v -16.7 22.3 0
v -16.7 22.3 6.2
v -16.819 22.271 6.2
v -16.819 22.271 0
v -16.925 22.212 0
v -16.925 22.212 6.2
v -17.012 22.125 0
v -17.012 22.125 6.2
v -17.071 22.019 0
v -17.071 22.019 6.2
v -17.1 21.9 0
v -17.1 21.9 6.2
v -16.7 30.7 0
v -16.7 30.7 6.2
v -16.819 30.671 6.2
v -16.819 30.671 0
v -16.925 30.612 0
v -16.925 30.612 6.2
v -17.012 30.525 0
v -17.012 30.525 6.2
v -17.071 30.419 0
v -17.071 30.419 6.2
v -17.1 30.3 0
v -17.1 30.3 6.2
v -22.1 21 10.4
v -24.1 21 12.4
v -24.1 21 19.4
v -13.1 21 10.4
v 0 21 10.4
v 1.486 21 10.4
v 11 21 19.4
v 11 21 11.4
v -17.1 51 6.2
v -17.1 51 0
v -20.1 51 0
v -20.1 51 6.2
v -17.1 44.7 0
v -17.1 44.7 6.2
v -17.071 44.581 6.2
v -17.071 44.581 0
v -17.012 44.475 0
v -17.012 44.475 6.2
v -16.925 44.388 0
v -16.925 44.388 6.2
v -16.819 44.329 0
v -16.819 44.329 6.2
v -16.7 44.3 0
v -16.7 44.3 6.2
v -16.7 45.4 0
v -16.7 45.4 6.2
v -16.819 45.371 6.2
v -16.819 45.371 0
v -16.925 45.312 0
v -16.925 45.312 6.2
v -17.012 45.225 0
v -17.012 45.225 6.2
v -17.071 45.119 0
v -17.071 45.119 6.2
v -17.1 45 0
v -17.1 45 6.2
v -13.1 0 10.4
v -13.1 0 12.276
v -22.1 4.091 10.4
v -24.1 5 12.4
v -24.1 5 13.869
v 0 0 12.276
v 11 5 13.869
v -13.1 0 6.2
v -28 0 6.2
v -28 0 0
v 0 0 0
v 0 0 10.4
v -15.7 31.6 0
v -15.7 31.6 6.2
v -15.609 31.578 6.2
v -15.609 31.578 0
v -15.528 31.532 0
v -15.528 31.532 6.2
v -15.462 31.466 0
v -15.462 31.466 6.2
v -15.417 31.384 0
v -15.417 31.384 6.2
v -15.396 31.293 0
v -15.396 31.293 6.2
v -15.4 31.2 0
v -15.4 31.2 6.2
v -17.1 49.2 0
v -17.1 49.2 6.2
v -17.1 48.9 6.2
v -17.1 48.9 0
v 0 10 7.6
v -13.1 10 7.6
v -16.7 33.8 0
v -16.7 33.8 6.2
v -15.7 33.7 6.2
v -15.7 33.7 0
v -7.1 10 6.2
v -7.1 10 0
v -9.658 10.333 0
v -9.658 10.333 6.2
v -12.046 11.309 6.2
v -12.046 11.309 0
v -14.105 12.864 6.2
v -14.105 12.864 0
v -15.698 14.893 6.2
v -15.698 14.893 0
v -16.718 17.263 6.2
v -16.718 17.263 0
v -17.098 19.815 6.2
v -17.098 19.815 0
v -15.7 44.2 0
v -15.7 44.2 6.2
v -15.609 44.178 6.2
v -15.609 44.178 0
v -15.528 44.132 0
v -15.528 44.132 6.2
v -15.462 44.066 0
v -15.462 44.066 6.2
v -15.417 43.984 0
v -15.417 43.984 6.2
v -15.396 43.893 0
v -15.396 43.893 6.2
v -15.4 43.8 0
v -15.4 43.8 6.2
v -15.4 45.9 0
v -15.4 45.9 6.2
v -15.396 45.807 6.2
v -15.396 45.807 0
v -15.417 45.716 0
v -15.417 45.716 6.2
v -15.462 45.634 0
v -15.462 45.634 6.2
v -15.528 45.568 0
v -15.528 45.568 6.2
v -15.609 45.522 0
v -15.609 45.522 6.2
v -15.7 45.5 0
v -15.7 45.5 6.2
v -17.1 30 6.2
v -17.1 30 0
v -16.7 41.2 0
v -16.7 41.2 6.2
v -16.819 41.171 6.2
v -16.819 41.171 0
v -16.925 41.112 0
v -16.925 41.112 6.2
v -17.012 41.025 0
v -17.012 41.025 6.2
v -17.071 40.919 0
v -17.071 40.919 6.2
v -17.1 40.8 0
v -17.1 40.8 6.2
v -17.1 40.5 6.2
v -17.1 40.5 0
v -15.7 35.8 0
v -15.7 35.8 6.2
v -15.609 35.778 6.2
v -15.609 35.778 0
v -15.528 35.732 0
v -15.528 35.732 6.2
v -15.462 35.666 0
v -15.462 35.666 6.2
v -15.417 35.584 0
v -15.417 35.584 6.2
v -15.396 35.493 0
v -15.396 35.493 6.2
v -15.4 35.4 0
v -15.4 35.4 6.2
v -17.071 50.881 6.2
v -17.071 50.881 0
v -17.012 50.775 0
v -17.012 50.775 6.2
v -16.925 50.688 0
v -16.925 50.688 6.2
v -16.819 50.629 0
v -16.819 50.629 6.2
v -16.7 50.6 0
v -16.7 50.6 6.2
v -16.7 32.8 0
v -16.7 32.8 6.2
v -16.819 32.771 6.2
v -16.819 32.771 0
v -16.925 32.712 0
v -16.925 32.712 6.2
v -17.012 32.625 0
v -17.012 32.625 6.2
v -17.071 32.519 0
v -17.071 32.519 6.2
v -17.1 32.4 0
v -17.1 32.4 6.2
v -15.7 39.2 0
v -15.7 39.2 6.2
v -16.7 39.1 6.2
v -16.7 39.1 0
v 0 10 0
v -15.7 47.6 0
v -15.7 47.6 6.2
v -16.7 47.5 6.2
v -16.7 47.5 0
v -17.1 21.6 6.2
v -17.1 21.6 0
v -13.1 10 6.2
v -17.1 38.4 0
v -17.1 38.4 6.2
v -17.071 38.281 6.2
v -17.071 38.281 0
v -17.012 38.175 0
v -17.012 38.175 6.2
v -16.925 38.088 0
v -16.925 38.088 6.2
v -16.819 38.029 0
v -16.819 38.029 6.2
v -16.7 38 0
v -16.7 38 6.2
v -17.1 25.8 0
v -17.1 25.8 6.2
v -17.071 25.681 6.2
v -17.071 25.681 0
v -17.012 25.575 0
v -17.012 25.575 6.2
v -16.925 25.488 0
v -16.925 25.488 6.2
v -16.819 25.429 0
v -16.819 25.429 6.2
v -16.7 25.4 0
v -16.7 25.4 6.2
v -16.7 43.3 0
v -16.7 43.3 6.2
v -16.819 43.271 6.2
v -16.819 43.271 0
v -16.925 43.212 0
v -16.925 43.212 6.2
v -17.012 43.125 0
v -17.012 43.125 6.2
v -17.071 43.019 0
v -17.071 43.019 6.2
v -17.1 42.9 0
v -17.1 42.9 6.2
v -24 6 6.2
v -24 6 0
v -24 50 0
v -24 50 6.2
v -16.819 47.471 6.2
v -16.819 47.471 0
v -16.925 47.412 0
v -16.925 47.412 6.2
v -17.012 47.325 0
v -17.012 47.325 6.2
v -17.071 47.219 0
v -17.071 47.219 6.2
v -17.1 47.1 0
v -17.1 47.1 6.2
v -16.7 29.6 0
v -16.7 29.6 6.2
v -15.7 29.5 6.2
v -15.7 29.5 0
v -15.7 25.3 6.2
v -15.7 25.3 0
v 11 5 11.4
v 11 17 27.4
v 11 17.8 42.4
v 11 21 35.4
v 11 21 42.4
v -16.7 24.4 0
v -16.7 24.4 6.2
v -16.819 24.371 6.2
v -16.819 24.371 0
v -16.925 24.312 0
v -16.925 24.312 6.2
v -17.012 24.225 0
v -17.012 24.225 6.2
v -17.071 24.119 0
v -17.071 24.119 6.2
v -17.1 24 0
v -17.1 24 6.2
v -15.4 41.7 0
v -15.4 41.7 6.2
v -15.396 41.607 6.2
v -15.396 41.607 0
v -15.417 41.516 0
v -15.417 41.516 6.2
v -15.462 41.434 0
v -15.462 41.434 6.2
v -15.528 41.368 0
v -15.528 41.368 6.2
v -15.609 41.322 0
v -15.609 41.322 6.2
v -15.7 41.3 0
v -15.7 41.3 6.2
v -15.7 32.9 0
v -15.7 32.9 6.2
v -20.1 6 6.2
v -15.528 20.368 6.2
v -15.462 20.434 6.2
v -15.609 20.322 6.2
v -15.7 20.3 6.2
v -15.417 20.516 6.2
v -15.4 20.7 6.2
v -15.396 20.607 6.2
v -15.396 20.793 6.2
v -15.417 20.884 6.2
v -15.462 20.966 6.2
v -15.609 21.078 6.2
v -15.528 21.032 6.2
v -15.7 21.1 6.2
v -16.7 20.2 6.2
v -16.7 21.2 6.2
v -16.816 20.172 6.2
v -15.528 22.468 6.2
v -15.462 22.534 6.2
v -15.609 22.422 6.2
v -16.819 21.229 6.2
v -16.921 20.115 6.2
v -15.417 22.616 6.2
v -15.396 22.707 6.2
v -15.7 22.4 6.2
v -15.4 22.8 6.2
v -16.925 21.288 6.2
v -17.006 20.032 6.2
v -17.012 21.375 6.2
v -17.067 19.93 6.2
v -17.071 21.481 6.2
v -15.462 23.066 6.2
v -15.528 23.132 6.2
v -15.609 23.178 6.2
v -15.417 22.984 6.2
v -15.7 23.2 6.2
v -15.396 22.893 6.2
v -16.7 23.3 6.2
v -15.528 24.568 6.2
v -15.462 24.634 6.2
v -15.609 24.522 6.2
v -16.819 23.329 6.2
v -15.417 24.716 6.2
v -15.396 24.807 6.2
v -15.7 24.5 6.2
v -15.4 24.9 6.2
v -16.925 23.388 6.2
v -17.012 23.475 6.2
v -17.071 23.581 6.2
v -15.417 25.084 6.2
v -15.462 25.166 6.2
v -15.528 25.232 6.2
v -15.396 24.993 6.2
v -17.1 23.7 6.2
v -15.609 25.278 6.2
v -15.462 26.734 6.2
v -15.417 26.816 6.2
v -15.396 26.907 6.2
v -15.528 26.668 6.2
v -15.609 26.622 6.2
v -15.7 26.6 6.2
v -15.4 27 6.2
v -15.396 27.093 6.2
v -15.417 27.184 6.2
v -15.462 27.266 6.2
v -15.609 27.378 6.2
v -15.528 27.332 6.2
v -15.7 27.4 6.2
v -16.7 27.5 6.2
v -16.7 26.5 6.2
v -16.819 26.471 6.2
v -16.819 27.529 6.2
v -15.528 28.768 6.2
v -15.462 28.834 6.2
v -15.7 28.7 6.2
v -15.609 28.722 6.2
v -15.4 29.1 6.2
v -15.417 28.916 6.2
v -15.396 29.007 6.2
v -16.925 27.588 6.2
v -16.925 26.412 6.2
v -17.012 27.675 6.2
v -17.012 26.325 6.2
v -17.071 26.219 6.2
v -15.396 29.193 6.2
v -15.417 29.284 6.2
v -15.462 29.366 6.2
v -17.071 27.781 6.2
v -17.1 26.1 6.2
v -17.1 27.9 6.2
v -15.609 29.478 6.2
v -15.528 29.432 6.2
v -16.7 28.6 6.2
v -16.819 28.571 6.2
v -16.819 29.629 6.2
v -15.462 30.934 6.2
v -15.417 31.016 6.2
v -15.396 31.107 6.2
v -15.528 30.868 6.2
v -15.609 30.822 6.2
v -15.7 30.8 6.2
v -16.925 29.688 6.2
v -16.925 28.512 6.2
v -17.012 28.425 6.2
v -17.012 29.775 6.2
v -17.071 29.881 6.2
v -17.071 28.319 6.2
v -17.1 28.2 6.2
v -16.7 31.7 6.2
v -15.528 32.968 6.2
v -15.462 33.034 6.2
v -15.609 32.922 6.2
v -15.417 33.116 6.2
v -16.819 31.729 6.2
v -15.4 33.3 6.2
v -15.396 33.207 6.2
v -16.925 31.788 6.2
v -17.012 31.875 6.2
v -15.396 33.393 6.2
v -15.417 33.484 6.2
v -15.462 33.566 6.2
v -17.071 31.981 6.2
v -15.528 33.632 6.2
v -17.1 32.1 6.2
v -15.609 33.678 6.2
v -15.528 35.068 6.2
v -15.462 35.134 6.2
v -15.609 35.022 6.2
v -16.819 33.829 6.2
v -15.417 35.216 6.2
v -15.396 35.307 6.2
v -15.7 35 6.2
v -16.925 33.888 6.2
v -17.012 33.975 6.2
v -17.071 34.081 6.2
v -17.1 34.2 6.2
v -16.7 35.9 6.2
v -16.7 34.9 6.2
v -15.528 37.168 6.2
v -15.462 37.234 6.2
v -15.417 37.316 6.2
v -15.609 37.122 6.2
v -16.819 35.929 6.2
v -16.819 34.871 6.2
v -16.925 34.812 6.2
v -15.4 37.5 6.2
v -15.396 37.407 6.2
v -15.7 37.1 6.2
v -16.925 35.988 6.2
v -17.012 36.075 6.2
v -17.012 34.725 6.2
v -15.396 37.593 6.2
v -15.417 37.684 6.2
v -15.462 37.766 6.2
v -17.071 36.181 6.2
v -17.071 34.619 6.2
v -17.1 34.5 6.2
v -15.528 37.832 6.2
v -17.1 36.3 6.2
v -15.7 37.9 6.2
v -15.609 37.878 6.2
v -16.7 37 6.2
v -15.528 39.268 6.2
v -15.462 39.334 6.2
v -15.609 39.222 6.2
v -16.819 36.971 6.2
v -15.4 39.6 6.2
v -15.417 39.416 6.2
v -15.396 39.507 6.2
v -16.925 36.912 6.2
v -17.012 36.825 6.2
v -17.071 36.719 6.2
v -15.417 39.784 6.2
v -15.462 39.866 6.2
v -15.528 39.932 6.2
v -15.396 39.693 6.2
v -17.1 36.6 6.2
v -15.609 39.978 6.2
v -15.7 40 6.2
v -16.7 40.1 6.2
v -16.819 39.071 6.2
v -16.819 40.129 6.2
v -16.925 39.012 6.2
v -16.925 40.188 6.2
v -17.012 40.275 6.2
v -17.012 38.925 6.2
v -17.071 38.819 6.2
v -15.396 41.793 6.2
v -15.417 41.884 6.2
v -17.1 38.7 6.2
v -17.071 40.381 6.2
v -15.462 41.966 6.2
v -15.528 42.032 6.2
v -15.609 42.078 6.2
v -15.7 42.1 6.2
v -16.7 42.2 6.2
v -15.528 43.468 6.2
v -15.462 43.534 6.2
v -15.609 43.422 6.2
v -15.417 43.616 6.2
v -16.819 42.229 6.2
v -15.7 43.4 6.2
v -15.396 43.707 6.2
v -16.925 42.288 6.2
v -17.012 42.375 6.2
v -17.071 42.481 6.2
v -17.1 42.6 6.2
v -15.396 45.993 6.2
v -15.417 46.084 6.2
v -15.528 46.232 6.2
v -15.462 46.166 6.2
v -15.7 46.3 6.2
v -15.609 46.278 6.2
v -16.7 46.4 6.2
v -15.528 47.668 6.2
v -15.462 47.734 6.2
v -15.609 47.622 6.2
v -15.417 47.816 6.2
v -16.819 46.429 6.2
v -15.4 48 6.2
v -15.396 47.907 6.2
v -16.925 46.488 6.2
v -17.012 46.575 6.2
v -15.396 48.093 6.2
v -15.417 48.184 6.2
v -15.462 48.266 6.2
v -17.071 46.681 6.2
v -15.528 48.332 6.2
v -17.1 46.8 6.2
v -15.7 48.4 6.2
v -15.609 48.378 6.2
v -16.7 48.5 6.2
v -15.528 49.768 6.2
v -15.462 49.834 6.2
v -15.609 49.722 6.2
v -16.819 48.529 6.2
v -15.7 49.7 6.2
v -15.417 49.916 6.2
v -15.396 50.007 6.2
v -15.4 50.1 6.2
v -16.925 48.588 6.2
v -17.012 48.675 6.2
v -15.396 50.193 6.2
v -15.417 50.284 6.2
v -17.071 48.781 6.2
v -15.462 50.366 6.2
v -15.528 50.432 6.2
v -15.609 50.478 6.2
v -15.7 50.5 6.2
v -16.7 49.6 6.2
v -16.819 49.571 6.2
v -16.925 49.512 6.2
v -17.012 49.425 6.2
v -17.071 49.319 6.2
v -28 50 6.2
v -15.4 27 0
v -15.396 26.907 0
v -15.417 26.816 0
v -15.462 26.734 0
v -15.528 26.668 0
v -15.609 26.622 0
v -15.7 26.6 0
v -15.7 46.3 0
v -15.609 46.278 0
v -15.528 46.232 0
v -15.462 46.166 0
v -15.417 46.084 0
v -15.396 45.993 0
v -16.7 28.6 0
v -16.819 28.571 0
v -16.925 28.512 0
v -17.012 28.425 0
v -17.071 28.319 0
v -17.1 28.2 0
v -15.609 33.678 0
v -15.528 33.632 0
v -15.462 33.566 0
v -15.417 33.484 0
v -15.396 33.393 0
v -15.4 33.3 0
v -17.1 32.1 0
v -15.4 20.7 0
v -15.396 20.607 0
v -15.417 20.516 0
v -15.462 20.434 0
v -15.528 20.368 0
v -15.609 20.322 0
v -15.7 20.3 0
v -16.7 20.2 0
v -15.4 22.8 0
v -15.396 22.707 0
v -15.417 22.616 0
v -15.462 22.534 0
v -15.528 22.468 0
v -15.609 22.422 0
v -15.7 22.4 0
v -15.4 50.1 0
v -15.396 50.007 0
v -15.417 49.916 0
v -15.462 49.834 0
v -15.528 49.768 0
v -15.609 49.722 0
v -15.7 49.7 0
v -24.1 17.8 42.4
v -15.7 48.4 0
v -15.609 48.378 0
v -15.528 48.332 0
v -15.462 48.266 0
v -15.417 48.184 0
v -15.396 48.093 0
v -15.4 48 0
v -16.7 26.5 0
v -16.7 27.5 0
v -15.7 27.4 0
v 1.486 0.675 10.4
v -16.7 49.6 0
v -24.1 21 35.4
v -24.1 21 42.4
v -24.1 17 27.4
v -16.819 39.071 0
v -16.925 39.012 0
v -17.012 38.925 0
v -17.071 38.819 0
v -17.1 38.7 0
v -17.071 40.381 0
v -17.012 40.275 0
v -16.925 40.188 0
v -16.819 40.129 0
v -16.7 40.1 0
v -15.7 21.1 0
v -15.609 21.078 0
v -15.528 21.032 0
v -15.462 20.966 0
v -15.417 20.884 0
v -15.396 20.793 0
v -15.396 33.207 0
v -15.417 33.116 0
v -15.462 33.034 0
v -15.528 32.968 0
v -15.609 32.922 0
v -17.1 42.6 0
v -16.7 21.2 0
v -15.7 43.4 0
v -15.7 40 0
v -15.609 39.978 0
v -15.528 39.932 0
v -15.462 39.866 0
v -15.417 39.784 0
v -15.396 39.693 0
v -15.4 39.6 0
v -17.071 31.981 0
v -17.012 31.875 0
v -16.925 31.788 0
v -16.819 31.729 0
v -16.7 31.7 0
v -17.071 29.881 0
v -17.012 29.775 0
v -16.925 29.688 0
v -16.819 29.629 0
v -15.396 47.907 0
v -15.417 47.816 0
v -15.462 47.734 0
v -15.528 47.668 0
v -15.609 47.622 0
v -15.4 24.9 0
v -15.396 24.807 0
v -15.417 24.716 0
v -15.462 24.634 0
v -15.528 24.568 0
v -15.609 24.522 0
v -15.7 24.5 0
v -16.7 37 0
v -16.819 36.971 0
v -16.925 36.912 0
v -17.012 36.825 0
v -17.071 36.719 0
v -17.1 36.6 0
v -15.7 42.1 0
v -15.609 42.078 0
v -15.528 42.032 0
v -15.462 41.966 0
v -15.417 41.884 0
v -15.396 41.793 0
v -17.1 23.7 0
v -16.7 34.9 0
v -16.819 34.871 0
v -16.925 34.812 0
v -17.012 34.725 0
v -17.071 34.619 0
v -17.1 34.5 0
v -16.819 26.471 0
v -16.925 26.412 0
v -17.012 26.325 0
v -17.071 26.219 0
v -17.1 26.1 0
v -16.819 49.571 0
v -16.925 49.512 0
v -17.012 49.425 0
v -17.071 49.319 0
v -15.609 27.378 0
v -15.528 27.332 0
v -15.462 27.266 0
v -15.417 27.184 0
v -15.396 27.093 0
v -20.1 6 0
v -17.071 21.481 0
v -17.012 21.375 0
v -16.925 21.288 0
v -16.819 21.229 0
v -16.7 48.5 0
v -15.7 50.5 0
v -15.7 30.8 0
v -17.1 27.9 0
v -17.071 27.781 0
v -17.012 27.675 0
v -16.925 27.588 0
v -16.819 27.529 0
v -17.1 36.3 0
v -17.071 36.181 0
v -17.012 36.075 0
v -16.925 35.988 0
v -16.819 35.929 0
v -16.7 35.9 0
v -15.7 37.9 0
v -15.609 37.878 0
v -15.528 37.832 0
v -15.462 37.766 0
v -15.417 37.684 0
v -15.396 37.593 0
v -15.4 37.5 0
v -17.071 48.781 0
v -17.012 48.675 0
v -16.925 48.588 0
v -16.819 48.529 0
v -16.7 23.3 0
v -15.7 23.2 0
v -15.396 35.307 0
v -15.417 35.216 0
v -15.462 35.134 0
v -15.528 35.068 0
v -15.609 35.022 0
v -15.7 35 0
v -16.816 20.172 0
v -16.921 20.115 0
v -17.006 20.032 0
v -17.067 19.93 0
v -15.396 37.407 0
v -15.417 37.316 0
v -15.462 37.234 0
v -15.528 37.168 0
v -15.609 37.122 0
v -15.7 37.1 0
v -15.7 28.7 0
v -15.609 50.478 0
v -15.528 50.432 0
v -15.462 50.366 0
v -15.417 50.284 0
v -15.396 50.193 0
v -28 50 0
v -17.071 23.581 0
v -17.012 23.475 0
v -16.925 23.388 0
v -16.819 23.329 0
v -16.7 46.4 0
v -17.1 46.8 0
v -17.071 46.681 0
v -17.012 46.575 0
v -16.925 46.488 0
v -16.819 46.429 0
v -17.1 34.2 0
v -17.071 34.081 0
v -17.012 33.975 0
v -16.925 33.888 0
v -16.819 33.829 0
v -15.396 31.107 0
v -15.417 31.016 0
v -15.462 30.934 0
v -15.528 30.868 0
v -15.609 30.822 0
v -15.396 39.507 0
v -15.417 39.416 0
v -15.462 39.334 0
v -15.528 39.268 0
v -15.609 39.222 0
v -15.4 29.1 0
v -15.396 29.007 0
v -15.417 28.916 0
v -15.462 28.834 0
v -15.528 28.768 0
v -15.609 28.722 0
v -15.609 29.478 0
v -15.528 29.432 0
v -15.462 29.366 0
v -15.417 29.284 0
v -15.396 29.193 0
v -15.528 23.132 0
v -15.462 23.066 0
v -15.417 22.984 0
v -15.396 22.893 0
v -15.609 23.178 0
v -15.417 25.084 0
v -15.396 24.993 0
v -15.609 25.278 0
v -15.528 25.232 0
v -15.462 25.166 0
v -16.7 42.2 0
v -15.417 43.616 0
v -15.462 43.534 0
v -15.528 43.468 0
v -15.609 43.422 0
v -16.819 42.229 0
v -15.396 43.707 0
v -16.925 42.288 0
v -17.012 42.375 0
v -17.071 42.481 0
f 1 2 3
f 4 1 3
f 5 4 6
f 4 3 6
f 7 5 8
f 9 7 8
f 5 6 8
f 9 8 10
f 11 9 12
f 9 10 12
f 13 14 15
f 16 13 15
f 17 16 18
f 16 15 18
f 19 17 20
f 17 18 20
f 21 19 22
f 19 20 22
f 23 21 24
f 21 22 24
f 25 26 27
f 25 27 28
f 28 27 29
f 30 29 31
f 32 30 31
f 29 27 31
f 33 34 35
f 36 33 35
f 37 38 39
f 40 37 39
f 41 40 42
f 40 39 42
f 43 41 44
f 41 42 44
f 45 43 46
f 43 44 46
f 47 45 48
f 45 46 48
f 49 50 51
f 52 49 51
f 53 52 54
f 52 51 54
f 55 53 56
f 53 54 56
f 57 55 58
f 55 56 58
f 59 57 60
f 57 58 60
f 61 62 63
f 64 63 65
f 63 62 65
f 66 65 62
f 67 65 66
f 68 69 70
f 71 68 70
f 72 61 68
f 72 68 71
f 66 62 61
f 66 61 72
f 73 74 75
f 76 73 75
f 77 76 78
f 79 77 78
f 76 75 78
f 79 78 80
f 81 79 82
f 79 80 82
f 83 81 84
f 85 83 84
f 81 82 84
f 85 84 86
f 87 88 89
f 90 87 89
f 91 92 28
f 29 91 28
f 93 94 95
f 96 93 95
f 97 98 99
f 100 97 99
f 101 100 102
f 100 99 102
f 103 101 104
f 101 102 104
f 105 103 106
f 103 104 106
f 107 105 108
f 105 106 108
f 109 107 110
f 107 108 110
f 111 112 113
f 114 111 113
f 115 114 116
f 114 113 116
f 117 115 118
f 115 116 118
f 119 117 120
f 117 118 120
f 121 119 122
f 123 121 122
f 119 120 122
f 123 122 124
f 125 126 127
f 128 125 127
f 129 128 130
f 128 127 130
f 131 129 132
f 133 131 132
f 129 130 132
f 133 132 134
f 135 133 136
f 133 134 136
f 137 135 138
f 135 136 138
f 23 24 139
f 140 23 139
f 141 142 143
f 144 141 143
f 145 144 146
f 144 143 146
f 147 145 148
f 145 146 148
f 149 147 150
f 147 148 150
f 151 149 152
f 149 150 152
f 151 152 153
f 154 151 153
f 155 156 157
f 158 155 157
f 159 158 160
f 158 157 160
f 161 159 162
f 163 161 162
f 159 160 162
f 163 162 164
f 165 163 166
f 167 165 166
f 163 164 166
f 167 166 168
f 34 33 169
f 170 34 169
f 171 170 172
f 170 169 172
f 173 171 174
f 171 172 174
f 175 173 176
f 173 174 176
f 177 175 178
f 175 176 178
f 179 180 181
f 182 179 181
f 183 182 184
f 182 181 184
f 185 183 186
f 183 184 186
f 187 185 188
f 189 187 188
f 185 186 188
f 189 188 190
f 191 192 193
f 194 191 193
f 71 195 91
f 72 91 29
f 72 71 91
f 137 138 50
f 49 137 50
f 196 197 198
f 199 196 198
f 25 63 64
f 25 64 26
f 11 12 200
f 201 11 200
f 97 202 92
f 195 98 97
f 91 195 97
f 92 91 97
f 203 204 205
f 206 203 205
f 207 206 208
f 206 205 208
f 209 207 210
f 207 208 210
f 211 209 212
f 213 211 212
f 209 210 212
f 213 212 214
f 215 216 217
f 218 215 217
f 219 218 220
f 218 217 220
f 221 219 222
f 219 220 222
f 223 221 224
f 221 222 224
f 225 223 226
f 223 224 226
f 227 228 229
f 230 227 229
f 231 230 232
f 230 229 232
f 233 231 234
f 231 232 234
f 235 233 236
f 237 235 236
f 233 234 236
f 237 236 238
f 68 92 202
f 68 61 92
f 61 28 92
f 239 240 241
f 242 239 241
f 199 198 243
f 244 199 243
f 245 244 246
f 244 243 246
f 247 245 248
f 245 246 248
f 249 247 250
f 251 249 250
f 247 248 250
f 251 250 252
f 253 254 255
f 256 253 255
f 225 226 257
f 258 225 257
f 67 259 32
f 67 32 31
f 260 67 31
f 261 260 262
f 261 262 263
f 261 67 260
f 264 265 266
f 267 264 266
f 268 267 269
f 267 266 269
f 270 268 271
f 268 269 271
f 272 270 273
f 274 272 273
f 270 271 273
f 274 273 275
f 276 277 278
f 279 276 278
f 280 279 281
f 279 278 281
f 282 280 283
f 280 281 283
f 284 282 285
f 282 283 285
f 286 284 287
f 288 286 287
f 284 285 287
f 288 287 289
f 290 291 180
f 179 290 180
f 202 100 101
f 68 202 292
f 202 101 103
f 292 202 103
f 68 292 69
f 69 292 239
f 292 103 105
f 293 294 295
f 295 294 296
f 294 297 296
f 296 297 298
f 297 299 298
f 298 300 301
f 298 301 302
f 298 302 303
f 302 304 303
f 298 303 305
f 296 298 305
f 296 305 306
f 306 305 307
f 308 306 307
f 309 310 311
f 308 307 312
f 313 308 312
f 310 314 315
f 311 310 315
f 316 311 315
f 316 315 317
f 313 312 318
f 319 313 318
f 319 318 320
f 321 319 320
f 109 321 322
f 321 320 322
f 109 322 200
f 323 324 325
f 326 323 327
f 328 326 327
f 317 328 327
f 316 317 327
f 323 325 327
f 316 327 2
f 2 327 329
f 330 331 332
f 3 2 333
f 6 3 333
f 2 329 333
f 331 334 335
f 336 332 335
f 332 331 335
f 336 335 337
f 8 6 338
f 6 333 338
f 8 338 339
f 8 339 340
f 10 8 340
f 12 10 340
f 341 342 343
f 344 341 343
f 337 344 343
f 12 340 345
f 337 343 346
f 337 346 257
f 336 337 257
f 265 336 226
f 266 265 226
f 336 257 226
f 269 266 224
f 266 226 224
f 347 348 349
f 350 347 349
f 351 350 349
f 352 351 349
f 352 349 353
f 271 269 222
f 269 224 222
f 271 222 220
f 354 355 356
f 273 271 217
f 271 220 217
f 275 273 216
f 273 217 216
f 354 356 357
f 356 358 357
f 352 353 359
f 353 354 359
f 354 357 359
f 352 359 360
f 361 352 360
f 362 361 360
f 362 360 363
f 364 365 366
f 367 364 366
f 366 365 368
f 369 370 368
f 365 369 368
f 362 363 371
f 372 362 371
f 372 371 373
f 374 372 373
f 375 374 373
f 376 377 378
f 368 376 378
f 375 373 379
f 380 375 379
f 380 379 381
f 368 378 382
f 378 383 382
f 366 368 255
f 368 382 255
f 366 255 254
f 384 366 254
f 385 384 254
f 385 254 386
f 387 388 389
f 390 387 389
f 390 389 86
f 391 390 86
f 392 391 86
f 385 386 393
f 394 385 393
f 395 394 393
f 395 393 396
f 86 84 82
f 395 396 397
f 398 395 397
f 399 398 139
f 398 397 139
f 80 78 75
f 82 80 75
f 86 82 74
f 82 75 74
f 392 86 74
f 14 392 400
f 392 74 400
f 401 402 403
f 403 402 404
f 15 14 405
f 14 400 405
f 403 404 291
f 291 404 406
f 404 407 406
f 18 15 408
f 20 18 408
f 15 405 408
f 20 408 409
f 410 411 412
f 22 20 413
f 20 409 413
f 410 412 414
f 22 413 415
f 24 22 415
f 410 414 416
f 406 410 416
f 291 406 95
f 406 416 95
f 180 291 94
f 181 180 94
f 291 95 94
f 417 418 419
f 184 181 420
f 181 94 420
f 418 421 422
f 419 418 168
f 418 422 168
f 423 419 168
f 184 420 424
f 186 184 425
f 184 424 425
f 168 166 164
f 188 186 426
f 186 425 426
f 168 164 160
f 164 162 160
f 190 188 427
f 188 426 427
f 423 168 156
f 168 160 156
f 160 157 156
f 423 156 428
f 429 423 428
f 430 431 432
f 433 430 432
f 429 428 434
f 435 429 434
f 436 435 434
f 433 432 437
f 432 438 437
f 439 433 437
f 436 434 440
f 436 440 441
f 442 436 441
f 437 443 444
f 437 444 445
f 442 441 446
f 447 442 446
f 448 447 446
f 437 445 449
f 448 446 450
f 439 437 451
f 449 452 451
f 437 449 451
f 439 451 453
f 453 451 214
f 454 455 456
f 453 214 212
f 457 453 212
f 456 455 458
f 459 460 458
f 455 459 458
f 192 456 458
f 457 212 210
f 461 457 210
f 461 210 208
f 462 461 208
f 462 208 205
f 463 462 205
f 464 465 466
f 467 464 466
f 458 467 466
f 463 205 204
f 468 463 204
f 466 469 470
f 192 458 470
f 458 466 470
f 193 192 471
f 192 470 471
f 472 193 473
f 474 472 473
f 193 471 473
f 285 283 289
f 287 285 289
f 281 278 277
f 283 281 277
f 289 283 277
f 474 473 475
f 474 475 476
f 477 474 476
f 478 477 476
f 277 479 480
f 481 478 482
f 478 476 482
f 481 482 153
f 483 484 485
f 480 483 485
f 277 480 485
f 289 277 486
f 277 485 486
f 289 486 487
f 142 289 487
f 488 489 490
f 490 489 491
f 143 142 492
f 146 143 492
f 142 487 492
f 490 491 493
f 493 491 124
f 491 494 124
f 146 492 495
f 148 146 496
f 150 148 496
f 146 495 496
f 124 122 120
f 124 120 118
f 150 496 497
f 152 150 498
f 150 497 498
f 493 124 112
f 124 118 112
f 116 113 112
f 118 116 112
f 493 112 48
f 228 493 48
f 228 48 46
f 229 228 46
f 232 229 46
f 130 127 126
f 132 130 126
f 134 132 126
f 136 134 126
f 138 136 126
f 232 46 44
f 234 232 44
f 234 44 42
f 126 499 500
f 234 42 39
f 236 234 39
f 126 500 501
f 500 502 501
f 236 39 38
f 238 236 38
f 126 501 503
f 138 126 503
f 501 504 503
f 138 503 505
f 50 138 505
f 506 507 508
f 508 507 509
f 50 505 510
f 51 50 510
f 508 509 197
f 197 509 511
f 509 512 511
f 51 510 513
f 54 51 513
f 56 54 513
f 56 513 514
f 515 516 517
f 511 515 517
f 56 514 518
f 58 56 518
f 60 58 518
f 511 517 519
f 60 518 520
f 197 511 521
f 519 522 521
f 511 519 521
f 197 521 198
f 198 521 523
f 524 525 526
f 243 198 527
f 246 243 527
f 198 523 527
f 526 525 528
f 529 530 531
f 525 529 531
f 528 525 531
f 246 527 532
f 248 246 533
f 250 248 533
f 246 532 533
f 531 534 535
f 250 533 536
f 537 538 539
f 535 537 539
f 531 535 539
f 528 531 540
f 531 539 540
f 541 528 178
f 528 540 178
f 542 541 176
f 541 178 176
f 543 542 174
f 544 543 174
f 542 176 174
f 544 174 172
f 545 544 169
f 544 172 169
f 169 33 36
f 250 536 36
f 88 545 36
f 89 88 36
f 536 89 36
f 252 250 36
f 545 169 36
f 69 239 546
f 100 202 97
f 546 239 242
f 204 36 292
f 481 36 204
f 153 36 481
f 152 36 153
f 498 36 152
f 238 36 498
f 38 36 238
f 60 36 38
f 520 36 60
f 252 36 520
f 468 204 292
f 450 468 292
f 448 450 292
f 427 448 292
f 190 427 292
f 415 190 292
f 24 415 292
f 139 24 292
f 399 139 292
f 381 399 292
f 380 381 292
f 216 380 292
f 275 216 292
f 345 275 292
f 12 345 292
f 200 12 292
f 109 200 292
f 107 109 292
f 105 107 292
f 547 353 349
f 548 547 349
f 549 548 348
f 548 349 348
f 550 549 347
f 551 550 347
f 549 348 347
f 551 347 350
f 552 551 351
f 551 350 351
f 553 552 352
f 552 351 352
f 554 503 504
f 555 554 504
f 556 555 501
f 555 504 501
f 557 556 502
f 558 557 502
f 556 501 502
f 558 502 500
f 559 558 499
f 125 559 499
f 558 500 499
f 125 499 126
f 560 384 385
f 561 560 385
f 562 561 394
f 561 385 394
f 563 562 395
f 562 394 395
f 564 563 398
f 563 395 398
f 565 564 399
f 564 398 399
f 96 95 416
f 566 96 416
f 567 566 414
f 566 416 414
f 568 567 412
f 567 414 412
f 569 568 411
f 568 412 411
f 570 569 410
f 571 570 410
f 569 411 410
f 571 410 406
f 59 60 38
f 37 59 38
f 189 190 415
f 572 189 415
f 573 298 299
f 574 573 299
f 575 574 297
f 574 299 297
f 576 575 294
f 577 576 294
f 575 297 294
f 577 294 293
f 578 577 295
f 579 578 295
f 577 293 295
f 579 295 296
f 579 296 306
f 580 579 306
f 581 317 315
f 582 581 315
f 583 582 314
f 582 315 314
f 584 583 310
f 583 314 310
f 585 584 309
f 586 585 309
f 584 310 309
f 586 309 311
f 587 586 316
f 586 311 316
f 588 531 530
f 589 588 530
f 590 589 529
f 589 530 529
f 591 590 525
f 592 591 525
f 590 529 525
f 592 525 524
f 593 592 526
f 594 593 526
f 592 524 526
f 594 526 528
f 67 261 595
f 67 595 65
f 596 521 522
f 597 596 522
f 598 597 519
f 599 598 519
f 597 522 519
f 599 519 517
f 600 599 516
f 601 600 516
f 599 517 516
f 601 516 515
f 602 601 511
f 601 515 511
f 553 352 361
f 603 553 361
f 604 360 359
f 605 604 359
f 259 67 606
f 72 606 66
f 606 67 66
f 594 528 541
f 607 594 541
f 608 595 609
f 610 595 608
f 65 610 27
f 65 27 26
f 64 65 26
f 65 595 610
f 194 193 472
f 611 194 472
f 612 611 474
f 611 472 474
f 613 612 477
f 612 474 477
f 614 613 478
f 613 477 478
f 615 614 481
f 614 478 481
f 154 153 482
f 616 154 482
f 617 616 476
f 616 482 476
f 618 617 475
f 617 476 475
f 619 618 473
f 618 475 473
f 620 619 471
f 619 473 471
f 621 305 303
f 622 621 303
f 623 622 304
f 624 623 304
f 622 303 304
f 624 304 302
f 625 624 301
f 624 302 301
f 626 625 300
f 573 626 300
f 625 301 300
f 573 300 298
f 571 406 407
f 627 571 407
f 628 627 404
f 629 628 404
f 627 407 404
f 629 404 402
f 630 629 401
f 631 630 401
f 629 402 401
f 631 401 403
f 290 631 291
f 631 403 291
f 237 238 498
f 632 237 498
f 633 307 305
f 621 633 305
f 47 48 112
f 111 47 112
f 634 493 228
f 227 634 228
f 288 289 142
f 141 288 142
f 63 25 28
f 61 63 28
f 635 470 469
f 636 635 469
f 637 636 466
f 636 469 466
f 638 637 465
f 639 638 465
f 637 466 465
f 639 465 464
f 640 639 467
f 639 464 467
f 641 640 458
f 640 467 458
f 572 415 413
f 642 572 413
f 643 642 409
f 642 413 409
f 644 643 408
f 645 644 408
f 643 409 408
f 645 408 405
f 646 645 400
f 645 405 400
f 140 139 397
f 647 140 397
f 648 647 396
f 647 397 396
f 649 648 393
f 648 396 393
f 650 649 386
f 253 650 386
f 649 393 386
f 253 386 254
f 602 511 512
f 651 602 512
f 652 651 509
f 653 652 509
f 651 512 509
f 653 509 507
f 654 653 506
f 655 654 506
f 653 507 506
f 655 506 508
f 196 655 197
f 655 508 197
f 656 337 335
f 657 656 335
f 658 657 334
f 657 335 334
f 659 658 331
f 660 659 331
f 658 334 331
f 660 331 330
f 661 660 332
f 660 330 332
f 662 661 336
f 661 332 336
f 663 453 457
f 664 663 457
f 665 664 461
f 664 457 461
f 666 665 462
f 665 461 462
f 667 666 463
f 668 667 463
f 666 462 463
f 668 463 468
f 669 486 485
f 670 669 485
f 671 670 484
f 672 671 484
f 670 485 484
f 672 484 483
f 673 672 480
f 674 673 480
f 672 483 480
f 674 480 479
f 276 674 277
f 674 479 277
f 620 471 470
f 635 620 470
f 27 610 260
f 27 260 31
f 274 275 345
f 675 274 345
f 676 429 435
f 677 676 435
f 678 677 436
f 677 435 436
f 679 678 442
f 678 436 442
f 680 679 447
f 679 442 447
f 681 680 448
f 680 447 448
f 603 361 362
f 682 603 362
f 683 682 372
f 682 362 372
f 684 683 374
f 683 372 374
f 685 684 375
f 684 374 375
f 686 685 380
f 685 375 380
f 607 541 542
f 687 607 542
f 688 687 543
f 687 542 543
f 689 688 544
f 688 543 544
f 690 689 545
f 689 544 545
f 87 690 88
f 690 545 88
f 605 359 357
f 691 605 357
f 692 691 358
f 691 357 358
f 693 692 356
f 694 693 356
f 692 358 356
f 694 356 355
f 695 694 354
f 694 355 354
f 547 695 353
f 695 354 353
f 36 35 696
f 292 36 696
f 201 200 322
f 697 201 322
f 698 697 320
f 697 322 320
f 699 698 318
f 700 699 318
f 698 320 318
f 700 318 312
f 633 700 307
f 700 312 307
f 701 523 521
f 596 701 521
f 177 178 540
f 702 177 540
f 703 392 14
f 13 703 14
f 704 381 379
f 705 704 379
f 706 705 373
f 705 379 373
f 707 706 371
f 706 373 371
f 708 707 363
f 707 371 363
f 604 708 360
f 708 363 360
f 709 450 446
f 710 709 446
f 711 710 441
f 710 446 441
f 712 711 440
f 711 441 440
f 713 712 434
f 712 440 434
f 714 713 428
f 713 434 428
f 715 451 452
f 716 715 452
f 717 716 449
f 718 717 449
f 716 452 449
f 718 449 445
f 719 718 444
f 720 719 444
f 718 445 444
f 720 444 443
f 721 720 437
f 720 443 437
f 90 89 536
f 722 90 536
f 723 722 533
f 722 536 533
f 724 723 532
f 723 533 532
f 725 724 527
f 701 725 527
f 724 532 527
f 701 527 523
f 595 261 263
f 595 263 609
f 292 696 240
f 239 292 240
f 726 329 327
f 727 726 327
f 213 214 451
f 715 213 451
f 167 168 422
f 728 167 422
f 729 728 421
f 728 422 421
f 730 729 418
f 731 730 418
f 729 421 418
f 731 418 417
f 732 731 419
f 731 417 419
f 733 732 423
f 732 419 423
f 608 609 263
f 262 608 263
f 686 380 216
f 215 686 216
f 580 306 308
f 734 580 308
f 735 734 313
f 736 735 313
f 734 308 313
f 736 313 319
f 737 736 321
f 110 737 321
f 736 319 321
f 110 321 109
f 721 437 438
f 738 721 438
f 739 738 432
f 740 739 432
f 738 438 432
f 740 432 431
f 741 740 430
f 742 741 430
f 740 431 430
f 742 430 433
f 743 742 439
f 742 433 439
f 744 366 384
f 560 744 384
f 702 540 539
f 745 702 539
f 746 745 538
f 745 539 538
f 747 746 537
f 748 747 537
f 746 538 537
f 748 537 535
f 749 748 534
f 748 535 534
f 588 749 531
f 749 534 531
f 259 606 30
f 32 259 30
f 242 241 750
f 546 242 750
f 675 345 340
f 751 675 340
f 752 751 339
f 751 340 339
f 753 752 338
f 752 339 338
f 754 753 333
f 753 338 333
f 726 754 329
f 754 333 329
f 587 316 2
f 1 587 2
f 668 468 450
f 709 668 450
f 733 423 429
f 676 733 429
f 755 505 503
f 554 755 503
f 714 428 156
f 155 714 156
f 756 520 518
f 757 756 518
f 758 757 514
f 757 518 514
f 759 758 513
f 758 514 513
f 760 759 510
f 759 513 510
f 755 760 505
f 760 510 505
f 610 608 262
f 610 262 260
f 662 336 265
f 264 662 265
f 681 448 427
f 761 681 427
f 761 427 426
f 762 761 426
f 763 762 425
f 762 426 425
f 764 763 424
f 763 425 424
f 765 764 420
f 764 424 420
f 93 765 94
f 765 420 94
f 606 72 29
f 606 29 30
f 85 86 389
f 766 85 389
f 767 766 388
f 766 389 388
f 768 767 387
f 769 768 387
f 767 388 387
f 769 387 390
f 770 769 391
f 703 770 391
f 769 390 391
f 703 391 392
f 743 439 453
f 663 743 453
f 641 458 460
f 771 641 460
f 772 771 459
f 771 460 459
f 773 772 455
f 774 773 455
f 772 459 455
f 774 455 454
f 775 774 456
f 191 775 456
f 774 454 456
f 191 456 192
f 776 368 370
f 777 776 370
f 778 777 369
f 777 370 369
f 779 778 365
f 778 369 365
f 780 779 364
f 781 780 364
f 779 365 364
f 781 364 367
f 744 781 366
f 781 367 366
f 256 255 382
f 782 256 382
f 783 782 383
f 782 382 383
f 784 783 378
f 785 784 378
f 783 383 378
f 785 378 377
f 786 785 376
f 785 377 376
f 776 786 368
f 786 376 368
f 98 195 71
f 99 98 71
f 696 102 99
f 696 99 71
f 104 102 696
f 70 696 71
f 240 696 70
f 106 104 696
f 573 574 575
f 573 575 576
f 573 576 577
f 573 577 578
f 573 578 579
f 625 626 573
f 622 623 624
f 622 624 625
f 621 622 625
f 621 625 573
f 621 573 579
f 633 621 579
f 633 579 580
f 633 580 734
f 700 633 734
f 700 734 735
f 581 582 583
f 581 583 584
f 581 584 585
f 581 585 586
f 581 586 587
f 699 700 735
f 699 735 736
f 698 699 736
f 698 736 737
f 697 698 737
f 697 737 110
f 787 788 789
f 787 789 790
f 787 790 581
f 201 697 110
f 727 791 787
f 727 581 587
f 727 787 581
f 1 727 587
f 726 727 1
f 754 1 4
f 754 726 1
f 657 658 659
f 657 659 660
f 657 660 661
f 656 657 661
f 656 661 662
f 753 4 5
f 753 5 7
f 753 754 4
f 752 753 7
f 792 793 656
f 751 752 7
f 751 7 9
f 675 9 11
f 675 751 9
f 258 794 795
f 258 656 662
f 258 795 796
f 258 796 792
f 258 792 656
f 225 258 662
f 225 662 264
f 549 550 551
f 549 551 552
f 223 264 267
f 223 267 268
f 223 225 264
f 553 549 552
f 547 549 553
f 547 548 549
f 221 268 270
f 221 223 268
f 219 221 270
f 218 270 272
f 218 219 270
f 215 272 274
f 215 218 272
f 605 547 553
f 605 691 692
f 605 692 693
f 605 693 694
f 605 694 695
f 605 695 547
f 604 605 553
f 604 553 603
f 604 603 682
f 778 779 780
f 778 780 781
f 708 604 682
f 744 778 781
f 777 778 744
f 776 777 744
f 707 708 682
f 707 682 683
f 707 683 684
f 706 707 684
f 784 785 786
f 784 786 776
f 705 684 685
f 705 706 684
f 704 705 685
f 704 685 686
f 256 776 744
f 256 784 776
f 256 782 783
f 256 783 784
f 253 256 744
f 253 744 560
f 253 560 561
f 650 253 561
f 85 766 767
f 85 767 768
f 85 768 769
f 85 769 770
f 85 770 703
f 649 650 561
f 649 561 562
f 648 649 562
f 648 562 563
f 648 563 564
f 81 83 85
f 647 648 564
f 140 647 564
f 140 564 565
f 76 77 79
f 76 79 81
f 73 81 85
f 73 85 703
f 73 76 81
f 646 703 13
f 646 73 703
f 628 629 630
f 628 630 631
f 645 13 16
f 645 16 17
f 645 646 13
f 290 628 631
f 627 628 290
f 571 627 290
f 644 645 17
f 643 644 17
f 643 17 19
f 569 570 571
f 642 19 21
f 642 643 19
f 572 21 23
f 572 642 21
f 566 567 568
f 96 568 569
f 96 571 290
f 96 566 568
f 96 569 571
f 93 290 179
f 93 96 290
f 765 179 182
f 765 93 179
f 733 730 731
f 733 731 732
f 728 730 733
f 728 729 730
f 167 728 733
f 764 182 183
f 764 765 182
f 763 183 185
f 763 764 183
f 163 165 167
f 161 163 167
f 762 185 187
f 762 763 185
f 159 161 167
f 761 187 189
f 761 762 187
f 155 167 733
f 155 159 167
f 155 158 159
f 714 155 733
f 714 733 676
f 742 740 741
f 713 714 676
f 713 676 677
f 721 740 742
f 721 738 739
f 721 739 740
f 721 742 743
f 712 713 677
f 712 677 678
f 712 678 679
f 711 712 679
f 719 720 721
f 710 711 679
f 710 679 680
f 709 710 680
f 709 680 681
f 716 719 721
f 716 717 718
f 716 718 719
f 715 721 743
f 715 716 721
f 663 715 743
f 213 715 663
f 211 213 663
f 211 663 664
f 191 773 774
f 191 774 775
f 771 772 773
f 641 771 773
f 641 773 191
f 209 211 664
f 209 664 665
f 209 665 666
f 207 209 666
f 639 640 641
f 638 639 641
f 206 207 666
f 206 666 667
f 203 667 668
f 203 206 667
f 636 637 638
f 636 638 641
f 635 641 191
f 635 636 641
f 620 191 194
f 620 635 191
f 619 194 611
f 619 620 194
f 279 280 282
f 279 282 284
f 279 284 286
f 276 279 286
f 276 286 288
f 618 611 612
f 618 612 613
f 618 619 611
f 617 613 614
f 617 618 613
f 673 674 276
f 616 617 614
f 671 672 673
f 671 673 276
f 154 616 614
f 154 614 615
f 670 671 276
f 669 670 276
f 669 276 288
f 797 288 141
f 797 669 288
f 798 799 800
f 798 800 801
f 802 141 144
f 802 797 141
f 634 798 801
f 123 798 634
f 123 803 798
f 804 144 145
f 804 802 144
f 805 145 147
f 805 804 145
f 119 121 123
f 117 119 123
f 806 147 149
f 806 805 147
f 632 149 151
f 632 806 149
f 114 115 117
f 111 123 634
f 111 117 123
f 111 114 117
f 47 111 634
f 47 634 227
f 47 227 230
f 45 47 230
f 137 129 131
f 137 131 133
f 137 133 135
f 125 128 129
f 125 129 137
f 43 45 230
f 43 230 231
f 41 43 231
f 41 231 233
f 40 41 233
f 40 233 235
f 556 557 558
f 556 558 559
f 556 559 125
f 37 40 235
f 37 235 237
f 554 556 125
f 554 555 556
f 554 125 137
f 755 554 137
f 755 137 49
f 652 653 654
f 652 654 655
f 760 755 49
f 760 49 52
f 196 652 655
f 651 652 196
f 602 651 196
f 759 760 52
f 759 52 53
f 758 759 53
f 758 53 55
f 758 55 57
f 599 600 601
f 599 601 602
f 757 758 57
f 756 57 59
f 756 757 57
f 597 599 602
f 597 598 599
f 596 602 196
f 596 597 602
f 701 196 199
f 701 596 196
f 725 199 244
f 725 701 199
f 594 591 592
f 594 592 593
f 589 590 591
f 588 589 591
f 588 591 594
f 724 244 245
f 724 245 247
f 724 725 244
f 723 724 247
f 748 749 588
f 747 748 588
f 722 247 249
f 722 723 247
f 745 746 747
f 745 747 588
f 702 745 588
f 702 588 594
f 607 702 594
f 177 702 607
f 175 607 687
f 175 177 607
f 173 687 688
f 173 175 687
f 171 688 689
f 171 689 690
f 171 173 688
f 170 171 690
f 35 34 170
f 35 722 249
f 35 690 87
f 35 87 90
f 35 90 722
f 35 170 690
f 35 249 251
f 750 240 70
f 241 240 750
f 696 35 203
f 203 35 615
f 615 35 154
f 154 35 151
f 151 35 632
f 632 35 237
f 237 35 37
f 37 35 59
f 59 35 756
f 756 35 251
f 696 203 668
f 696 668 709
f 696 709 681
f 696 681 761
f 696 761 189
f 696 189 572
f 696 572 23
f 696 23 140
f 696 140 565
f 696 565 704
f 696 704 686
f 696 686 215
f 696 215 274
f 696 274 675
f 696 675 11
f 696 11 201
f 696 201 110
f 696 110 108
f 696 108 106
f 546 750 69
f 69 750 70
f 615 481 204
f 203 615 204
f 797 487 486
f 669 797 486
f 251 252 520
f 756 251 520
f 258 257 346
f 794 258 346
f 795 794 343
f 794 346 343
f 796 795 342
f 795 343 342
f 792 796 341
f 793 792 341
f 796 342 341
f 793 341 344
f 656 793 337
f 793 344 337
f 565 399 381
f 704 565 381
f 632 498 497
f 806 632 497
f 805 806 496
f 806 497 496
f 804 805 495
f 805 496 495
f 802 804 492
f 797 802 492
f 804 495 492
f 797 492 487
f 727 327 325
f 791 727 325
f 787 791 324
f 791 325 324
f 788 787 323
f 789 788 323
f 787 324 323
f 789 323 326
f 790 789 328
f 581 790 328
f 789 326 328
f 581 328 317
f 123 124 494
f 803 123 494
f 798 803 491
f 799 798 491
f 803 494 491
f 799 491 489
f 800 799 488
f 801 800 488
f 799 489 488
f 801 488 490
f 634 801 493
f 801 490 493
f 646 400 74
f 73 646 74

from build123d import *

# Parameters (mm, degrees)
BOSS_EXTRUDE1_DEPTH = 6.2
BOSS_EXTRUDE2_DEPTH = 21
CHAMFER1_SIZE       = 5
CHAMFER1_SIZE2      = 28.356409098
CUT_EXTRUDE1_REACH  = 73.991
CHAMFER2_SIZE       = 1
CHAMFER2_SIZE2      = 9.514364454
CHAMFER3_SIZE       = 2
CUT_EXTRUDE2_REACH  = 78.94
CUT_EXTRUDE3_START  = -3.468867
CUT_EXTRUDE3_DEPTH  = 3.468867
BOSS_EXTRUDE3_DEPTH = 6.2
CUT_EXTRUDE4_REACH  = 78.94


with BuildPart() as part:
    # Sketch1 → Boss-Extrude1 (new body)
    with BuildSketch(Plane.XY):
        with BuildLine():
            Line((-28, 0), (0, 0))
            Line((0, 0), (0, 10))
            Line((0, 10), (-7.1, 10))
            ThreePointArc((-7.1, 10), (-14.171067812, 12.928932188), (-17.1, 20))
            Line((-17.1, 20), (-17.1, 51))
            Line((-17.1, 51), (-20.1, 51))
            Line((-20.1, 51), (-20.1, 6))
            Line((-20.1, 6), (-24, 6))
            Line((-24, 6), (-24, 50))
            Line((-24, 50), (-28, 50))
            Line((-28, 50), (-28, 0))
        make_face()
    extrude(amount=BOSS_EXTRUDE1_DEPTH)

    # Sketch2 → Boss-Extrude2 (add)
    with BuildSketch(Plane.XZ):
        Polygon((0, 6.2), (0, 10.4), (11, 10.4), (11, 42.4), (-24.1, 42.4), (-24.1, 10.4), (-13.1, 10.4), (-13.1, 6.2), align=None)
    extrude(amount=-BOSS_EXTRUDE2_DEPTH)

    # Chamfer1
    chamfer1_edges = [part.edges().sort_by_distance(p)[0] for p in [
        (-6.55, 0, 42.4),
    ]]
    chamfer1_side = [part.faces().sort_by_distance(p)[0] for p in [
        (-6.55, 10.5, 42.4),
    ]]
    chamfer(chamfer1_edges, length=CHAMFER1_SIZE, length2=CHAMFER1_SIZE2, reference=chamfer1_side[0])

    # Sketch3 → Cut-Extrude1 (cut, up to next)
    with BuildSketch(Plane(origin=(0, 0, 0), x_dir=(0, 0, -1), z_dir=(1, 0, 0)), mode=Mode.PRIVATE) as cut_extrude1_sk1:
        Polygon((-6.2, 10), (-7.6, 10), (-10.4, 21), (-6.2, 21), align=None)
    cut_extrude1_tool1 = extrude(cut_extrude1_sk1.sketch, amount=-CUT_EXTRUDE1_REACH, mode=Mode.PRIVATE) & part.part
    add(cut_extrude1_tool1.solids().sort_by_distance((0, 16.416667, 7.716667))[0], mode=Mode.SUBTRACT)

    # Chamfer2
    chamfer2_edges = [part.edges().sort_by_distance(p)[0] for p in [
        (11, 10.5, 10.4),
    ]]
    chamfer2_side = [part.faces().sort_by_distance(p)[0] for p in [
        (11, 11.541747932, 25.62778603),
    ]]
    chamfer(chamfer2_edges, length=CHAMFER2_SIZE, length2=CHAMFER2_SIZE2, reference=chamfer2_side[0])

    # Chamfer3
    chamfer3_edges = [part.edges().sort_by_distance(p)[0] for p in [
        (-24.1, 10.5, 10.4),
    ]]
    chamfer(chamfer3_edges, length=CHAMFER3_SIZE)

    # Sketch5 → Cut-Extrude2 (cut, up to next)
    with BuildSketch(Plane(origin=(11, 0, 0), x_dir=(0, 0, -1), z_dir=(1, 0, 0)), mode=Mode.PRIVATE) as cut_extrude2_sk1:
        Polygon((-42.4, 17.8), (-13.86886709, 5), (-10.966215349, -4.108657177), (-44.036924755, 0.937700744), align=None)
    cut_extrude2_tool1 = extrude(cut_extrude2_sk1.sketch, amount=-CUT_EXTRUDE2_REACH, mode=Mode.PRIVATE) & part.part
    add(cut_extrude2_tool1.solids().sort_by_distance((11, 5.258773, 29.627692))[0], mode=Mode.SUBTRACT)

    # Sketch6 → Cut-Extrude3 (cut)
    with BuildSketch(Plane(origin=(0, 0, 10.4), x_dir=(-1, 0, 0), z_dir=(0, 0, -1)).offset(CUT_EXTRUDE3_START)):
        Polygon((13.1, 0), (24.1, 5), (37.198342989, 5), (28.62602328, -4.522208447), (-13.825974113, -5.629287686), (-20.705007466, 5), (-11, 5), (0, 0), align=None)
    extrude(amount=CUT_EXTRUDE3_DEPTH, mode=Mode.SUBTRACT)

    # Sketch7 → Boss-Extrude3 (add)
    with BuildSketch(Plane.XY.offset(6.2)):
        with BuildLine():
            Line((-16.7, 50.6), (-15.7, 50.5))
            ThreePointArc((-15.7, 50.5), (-15.462165524, 50.365875857), (-15.4, 50.1))
            ThreePointArc((-15.4, 50.1), (-15.462165524, 49.834124143), (-15.7, 49.7))
            Line((-15.7, 49.7), (-16.7, 49.6))
            ThreePointArc((-16.7, 49.6), (-16.971392676, 49.471392676), (-17.1, 49.2))
            Line((-17.1, 49.2), (-17.1, 48.9))
            ThreePointArc((-17.1, 48.9), (-16.971392676, 48.628607324), (-16.7, 48.5))
            Line((-16.7, 48.5), (-15.7, 48.4))
            ThreePointArc((-15.7, 48.4), (-15.462165524, 48.265875857), (-15.4, 48))
            ThreePointArc((-15.4, 48), (-15.462165524, 47.734124143), (-15.7, 47.6))
            Line((-15.7, 47.6), (-16.7, 47.5))
            ThreePointArc((-16.7, 47.5), (-16.971392676, 47.371392676), (-17.1, 47.1))
            Line((-17.1, 47.1), (-17.1, 46.8))
            ThreePointArc((-17.1, 46.8), (-16.971392676, 46.528607324), (-16.7, 46.4))
            Line((-16.7, 46.4), (-15.7, 46.3))
            ThreePointArc((-15.7, 46.3), (-15.462165524, 46.165875857), (-15.4, 45.9))
            ThreePointArc((-15.4, 45.9), (-15.462165524, 45.634124143), (-15.7, 45.5))
            Line((-15.7, 45.5), (-16.7, 45.4))
            ThreePointArc((-16.7, 45.4), (-16.971392676, 45.271392676), (-17.1, 45))
            Line((-17.1, 45), (-17.1, 44.7))
            ThreePointArc((-17.1, 44.7), (-16.971392676, 44.428607324), (-16.7, 44.3))
            Line((-16.7, 44.3), (-15.7, 44.2))
            ThreePointArc((-15.7, 44.2), (-15.462165524, 44.065875857), (-15.4, 43.8))
            ThreePointArc((-15.4, 43.8), (-15.462165524, 43.534124143), (-15.7, 43.4))
            Line((-15.7, 43.4), (-16.7, 43.3))
            ThreePointArc((-16.7, 43.3), (-16.971392676, 43.171392676), (-17.1, 42.9))
            Line((-17.1, 42.9), (-17.1, 42.6))
            ThreePointArc((-17.1, 42.6), (-16.971392676, 42.328607324), (-16.7, 42.2))
            Line((-16.7, 42.2), (-15.7, 42.1))
            ThreePointArc((-15.7, 42.1), (-15.462165524, 41.965875857), (-15.4, 41.7))
            ThreePointArc((-15.4, 41.7), (-15.462165524, 41.434124143), (-15.7, 41.3))
            Line((-15.7, 41.3), (-16.7, 41.2))
            ThreePointArc((-16.7, 41.2), (-16.971392676, 41.071392676), (-17.1, 40.8))
            Line((-17.1, 40.8), (-17.1, 40.5))
            ThreePointArc((-17.1, 40.5), (-16.971392676, 40.228607324), (-16.7, 40.1))
            Line((-16.7, 40.1), (-15.7, 40))
            ThreePointArc((-15.7, 40), (-15.462165524, 39.865875857), (-15.4, 39.6))
            ThreePointArc((-15.4, 39.6), (-15.462165524, 39.334124143), (-15.7, 39.2))
            Line((-15.7, 39.2), (-16.7, 39.1))
            ThreePointArc((-16.7, 39.1), (-16.971392676, 38.971392676), (-17.1, 38.7))
            Line((-17.1, 38.7), (-17.1, 38.4))
            ThreePointArc((-17.1, 38.4), (-16.971392676, 38.128607324), (-16.7, 38))
            Line((-16.7, 38), (-15.7, 37.9))
            ThreePointArc((-15.7, 37.9), (-15.462165524, 37.765875857), (-15.4, 37.5))
            ThreePointArc((-15.4, 37.5), (-15.462165524, 37.234124143), (-15.7, 37.1))
            Line((-15.7, 37.1), (-16.7, 37))
            ThreePointArc((-16.7, 37), (-16.971392676, 36.871392676), (-17.1, 36.6))
            Line((-17.1, 36.6), (-17.1, 36.3))
            ThreePointArc((-17.1, 36.3), (-16.971392676, 36.028607324), (-16.7, 35.9))
            Line((-16.7, 35.9), (-15.7, 35.8))
            ThreePointArc((-15.7, 35.8), (-15.462165524, 35.665875857), (-15.4, 35.4))
            ThreePointArc((-15.4, 35.4), (-15.462165524, 35.134124143), (-15.7, 35))
            Line((-15.7, 35), (-16.7, 34.9))
            ThreePointArc((-16.7, 34.9), (-16.971392676, 34.771392676), (-17.1, 34.5))
            Line((-17.1, 34.5), (-17.1, 34.2))
            ThreePointArc((-17.1, 34.2), (-16.971392676, 33.928607324), (-16.7, 33.8))
            Line((-16.7, 33.8), (-15.7, 33.7))
            ThreePointArc((-15.7, 33.7), (-15.462165524, 33.565875857), (-15.4, 33.3))
            ThreePointArc((-15.4, 33.3), (-15.462165524, 33.034124143), (-15.7, 32.9))
            Line((-15.7, 32.9), (-16.7, 32.8))
            ThreePointArc((-16.7, 32.8), (-16.971392676, 32.671392676), (-17.1, 32.4))
            Line((-17.1, 32.4), (-17.1, 32.1))
            ThreePointArc((-17.1, 32.1), (-16.971392676, 31.828607324), (-16.7, 31.7))
            Line((-16.7, 31.7), (-15.7, 31.6))
            ThreePointArc((-15.7, 31.6), (-15.462165524, 31.465875857), (-15.4, 31.2))
            ThreePointArc((-15.4, 31.2), (-15.462165524, 30.934124143), (-15.7, 30.8))
            Line((-15.7, 30.8), (-16.7, 30.7))
            ThreePointArc((-16.7, 30.7), (-16.971392676, 30.571392676), (-17.1, 30.3))
            Line((-17.1, 30.3), (-17.1, 30))
            ThreePointArc((-17.1, 30), (-16.971392676, 29.728607324), (-16.7, 29.6))
            Line((-16.7, 29.6), (-15.7, 29.5))
            ThreePointArc((-15.7, 29.5), (-15.462165524, 29.365875857), (-15.4, 29.1))
            ThreePointArc((-15.4, 29.1), (-15.462165524, 28.834124143), (-15.7, 28.7))
            Line((-15.7, 28.7), (-16.7, 28.6))
            ThreePointArc((-16.7, 28.6), (-16.971392676, 28.471392676), (-17.1, 28.2))
            Line((-17.1, 28.2), (-17.1, 27.9))
            ThreePointArc((-17.1, 27.9), (-16.971392676, 27.628607324), (-16.7, 27.5))
            Line((-16.7, 27.5), (-15.7, 27.4))
            ThreePointArc((-15.7, 27.4), (-15.462165524, 27.265875857), (-15.4, 27))
            ThreePointArc((-15.4, 27), (-15.462165524, 26.734124143), (-15.7, 26.6))
            Line((-15.7, 26.6), (-16.7, 26.5))
            ThreePointArc((-16.7, 26.5), (-16.971392676, 26.371392676), (-17.1, 26.1))
            Line((-17.1, 26.1), (-17.1, 25.8))
            ThreePointArc((-17.1, 25.8), (-16.971392676, 25.528607324), (-16.7, 25.4))
            Line((-16.7, 25.4), (-15.7, 25.3))
            ThreePointArc((-15.7, 25.3), (-15.462165524, 25.165875857), (-15.4, 24.9))
            ThreePointArc((-15.4, 24.9), (-15.462165524, 24.634124143), (-15.7, 24.5))
            Line((-15.7, 24.5), (-16.7, 24.4))
            ThreePointArc((-16.7, 24.4), (-16.971392676, 24.271392676), (-17.1, 24))
            Line((-17.1, 24), (-17.1, 23.7))
            ThreePointArc((-17.1, 23.7), (-16.971392676, 23.428607324), (-16.7, 23.3))
            Line((-16.7, 23.3), (-15.7, 23.2))
            ThreePointArc((-15.7, 23.2), (-15.462165524, 23.065875857), (-15.4, 22.8))
            ThreePointArc((-15.4, 22.8), (-15.462165524, 22.534124143), (-15.7, 22.4))
            Line((-15.7, 22.4), (-16.7, 22.3))
            ThreePointArc((-16.7, 22.3), (-16.971392676, 22.171392676), (-17.1, 21.9))
            Line((-17.1, 21.9), (-17.1, 21.6))
            ThreePointArc((-17.1, 21.6), (-16.971392676, 21.328607324), (-16.7, 21.2))
            Line((-16.7, 21.2), (-15.7, 21.1))
            ThreePointArc((-15.7, 21.1), (-15.462165524, 20.965875857), (-15.4, 20.7))
            ThreePointArc((-15.4, 20.7), (-15.462165524, 20.434124143), (-15.7, 20.3))
            Line((-15.7, 20.3), (-16.7, 20.2))
            ThreePointArc((-16.7, 20.2), (-16.971392676, 20.071392676), (-17.1, 19.8))
            Line((-17.1, 19.8), (-17.1, 19.5))
            Line((-17.1, 19.5), (-18.637373825, 21.126261745))
            Line((-18.637373825, 21.126261745), (-18.815, 46.4))
            Line((-18.815, 46.4), (-17.1, 51))
            ThreePointArc((-17.1, 51), (-16.971392676, 50.728607324), (-16.7, 50.6))
        make_face()
    extrude(amount=-BOSS_EXTRUDE3_DEPTH)

    # Sketch8 → Cut-Extrude4 (cut, up to next)
    with BuildSketch(Plane(origin=(11, 0, 0), x_dir=(0, 0, -1), z_dir=(1, 0, 0)), mode=Mode.PRIVATE) as cut_extrude4_sk1:
        Polygon((-35.4, 21), (-27.4, 17), (-19.4, 21), align=None)
    cut_extrude4_tool1 = extrude(cut_extrude4_sk1.sketch, amount=-CUT_EXTRUDE4_REACH, mode=Mode.PRIVATE) & part.part
    add(cut_extrude4_tool1.solids().sort_by_distance((11, 19.666667, 27.4))[0], mode=Mode.SUBTRACT)


solid = part.part
